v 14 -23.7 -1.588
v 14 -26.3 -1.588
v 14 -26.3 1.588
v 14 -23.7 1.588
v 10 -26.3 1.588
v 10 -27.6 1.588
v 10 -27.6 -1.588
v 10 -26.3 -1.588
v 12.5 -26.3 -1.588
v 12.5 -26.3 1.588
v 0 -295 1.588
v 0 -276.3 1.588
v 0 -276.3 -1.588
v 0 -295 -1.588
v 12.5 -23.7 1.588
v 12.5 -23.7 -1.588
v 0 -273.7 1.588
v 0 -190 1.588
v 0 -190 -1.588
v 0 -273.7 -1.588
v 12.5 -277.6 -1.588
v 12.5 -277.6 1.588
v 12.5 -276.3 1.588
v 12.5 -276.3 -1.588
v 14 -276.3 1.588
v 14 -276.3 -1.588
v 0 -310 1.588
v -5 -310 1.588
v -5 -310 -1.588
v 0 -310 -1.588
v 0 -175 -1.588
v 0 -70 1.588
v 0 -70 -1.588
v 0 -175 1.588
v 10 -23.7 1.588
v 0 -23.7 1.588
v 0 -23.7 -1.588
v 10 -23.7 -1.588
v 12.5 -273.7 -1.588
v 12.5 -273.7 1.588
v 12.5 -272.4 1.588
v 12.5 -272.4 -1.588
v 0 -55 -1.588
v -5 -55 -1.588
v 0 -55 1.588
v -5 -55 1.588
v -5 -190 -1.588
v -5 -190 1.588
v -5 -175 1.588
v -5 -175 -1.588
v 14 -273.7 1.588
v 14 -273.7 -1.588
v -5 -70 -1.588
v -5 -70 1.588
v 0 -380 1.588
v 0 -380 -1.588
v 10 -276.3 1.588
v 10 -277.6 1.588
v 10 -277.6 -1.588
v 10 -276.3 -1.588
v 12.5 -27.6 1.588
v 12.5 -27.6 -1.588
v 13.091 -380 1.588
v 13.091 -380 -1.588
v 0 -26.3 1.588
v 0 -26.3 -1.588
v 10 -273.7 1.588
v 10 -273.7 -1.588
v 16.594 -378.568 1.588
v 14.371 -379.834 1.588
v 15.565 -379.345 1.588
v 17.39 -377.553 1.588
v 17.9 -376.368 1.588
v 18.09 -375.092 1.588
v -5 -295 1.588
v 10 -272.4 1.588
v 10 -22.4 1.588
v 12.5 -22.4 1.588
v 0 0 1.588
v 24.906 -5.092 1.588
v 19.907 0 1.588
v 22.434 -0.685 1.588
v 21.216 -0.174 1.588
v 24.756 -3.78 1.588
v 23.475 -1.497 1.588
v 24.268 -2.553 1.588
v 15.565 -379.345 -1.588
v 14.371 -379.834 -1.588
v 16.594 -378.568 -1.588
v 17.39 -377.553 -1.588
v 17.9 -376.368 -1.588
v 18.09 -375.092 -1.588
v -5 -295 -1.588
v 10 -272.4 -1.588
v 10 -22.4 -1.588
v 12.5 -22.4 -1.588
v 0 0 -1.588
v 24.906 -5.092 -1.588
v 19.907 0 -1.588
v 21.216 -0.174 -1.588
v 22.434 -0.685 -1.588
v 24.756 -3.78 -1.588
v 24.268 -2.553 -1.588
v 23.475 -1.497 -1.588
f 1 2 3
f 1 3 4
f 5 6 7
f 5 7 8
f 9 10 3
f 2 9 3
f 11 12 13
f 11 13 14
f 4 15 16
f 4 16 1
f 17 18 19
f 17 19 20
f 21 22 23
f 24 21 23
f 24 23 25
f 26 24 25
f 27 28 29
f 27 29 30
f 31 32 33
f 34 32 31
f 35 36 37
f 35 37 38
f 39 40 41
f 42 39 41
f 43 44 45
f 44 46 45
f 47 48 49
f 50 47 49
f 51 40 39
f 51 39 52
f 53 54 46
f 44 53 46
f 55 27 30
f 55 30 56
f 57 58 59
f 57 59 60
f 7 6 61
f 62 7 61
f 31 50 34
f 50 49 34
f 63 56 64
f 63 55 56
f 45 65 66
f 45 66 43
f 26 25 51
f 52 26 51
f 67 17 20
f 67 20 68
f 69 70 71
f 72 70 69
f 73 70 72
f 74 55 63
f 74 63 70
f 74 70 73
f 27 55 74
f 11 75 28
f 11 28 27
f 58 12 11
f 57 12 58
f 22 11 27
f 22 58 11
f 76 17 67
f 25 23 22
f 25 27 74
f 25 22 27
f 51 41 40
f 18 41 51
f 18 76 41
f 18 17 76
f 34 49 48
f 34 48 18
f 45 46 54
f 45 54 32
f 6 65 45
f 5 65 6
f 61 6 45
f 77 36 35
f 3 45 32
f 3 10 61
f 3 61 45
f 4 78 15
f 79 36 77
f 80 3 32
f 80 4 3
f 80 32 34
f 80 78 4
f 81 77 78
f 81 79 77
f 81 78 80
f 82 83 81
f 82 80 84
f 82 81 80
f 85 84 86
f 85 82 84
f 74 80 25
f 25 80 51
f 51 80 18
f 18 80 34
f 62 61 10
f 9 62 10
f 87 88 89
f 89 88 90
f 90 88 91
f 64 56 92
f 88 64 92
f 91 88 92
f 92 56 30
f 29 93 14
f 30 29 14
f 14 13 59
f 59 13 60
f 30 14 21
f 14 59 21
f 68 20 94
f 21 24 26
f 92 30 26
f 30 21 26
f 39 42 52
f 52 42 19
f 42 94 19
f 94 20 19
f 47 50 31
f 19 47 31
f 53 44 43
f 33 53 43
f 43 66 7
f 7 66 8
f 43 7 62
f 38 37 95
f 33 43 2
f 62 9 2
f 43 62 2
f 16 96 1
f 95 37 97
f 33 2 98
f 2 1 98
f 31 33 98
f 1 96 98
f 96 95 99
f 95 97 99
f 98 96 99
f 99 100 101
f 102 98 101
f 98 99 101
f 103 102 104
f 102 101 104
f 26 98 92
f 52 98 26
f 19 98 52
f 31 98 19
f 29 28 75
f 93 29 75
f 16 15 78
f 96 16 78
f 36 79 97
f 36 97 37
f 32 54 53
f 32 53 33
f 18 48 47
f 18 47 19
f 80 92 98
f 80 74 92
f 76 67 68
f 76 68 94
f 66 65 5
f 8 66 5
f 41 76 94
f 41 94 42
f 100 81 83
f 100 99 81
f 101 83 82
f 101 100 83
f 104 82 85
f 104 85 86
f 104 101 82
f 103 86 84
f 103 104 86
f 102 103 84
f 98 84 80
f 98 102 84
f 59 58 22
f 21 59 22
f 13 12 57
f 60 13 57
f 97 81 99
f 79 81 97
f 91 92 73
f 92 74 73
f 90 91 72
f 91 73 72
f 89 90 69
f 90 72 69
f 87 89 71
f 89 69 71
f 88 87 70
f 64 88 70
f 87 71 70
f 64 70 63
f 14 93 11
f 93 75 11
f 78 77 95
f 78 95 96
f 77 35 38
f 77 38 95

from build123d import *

# Parameters (mm, degrees)
BOSS_EXTRUDE1_DEPTH             = 1.5875
BOSS_EXTRUDE2_REACH             = 382.825
SKETCH1_4_W                     = 5
SKETCH1_4_H                     = 15
BOSS_EXTRUDE2_DIRECTION_2_REACH = 382.825
SKETCH1_5_W                     = 2.5
SKETCH1_5_H                     = 5.2
SKETCH1_5_W_2                   = 14
SKETCH1_5_H_2                   = 2.6
CUT_EXTRUDE2_DEPTH              = 381.824789314
LPATTERN1_COUNT                 = 3
LPATTERN1_PITCH                 = 120
LPATTERN3_COUNT                 = 2
LPATTERN3_PITCH                 = 250
FILLET1_R                       = 5


with BuildPart() as part:
    # Sketch1 → Boss-Extrude1 (new, symmetric)
    with BuildSketch(Plane.XY):
        Polygon((0, 0), (0, -380), (18, -380), (25, 0), align=None)
    extrude(amount=BOSS_EXTRUDE1_DEPTH, both=True)

    # Boss-Extrude2: up to this face of the body (flat: up to its plane)
    boss_extrude2_end = Plane(part.part.faces().sort_by_distance((10.84496124, -179.689922481, 1.5875))[0])
    # Sketch1_4 → Boss-Extrude2 (add, up to the picked face)
    with BuildSketch(Plane.XY, mode=Mode.PRIVATE) as boss_extrude2_sk1:
        with Locations((-2.5, -62.5)):
            Rectangle(SKETCH1_4_W, SKETCH1_4_H)
    boss_extrude2_tool1 = split(extrude(boss_extrude2_sk1.sketch, amount=BOSS_EXTRUDE2_REACH, mode=Mode.PRIVATE), bisect_by=boss_extrude2_end, keep=Keep.BOTH, mode=Mode.PRIVATE)
    boss_extrude2 = boss_extrude2_tool1.solids().sort_by(Axis((-2.5, -62.5, 0), (0, 0, 1)))[0]
    add(boss_extrude2)

    # Boss-Extrude2 direction 2: up to this face of the body (flat: up to its plane)
    boss_extrude2_direction_2_end = Plane(part.part.faces().sort_by_distance((10.84496124, -179.689922481, -1.5875))[0])
    # Sketch1_4 → Boss-Extrude2 direction 2 (add, up to the picked face)
    with BuildSketch(Plane.XY, mode=Mode.PRIVATE) as boss_extrude2_direction_2_sk1:
        with Locations((-2.5, -62.5)):
            Rectangle(SKETCH1_4_W, SKETCH1_4_H)
    boss_extrude2_direction_2_tool1 = split(extrude(boss_extrude2_direction_2_sk1.sketch, amount=-BOSS_EXTRUDE2_DIRECTION_2_REACH, mode=Mode.PRIVATE), bisect_by=boss_extrude2_direction_2_end, keep=Keep.BOTH, mode=Mode.PRIVATE)
    boss_extrude2_direction_2 = boss_extrude2_direction_2_tool1.solids().sort_by(Axis((-2.5, -62.5, 0), (0, 0, -1)))[0]
    add(boss_extrude2_direction_2)

    # Sketch1_5 → Cut-Extrude2 (cut, symmetric)
    with BuildSketch(Plane.XY):
        with Locations((11.25, -25)):
            Rectangle(SKETCH1_5_W, SKETCH1_5_H)
        with Locations((7, -25)):
            Rectangle(SKETCH1_5_W_2, SKETCH1_5_H_2)
    cut_extrude2 = extrude(amount=CUT_EXTRUDE2_DEPTH, both=True, mode=Mode.SUBTRACT)

    # LPattern1: Boss-Extrude2, Boss-Extrude2 direction 2 ×3
    with Locations(*[(0, -i * LPATTERN1_PITCH, 0) for i in range(1, LPATTERN1_COUNT)]):
        add(boss_extrude2)
        add(boss_extrude2_direction_2)

    # LPattern3: Cut-Extrude2 ×2
    with Locations(*[(0, -i * LPATTERN3_PITCH, 0) for i in range(1, LPATTERN3_COUNT)]):
        add(cut_extrude2, mode=Mode.SUBTRACT)

    # Fillet1
    fillet1_edges = [part.edges().sort_by_distance(p)[0] for p in [
        (18, -380, 0),
        (25, 0, 0),
    ]]
    fillet(fillet1_edges, radius=FILLET1_R)


solid = part.part
